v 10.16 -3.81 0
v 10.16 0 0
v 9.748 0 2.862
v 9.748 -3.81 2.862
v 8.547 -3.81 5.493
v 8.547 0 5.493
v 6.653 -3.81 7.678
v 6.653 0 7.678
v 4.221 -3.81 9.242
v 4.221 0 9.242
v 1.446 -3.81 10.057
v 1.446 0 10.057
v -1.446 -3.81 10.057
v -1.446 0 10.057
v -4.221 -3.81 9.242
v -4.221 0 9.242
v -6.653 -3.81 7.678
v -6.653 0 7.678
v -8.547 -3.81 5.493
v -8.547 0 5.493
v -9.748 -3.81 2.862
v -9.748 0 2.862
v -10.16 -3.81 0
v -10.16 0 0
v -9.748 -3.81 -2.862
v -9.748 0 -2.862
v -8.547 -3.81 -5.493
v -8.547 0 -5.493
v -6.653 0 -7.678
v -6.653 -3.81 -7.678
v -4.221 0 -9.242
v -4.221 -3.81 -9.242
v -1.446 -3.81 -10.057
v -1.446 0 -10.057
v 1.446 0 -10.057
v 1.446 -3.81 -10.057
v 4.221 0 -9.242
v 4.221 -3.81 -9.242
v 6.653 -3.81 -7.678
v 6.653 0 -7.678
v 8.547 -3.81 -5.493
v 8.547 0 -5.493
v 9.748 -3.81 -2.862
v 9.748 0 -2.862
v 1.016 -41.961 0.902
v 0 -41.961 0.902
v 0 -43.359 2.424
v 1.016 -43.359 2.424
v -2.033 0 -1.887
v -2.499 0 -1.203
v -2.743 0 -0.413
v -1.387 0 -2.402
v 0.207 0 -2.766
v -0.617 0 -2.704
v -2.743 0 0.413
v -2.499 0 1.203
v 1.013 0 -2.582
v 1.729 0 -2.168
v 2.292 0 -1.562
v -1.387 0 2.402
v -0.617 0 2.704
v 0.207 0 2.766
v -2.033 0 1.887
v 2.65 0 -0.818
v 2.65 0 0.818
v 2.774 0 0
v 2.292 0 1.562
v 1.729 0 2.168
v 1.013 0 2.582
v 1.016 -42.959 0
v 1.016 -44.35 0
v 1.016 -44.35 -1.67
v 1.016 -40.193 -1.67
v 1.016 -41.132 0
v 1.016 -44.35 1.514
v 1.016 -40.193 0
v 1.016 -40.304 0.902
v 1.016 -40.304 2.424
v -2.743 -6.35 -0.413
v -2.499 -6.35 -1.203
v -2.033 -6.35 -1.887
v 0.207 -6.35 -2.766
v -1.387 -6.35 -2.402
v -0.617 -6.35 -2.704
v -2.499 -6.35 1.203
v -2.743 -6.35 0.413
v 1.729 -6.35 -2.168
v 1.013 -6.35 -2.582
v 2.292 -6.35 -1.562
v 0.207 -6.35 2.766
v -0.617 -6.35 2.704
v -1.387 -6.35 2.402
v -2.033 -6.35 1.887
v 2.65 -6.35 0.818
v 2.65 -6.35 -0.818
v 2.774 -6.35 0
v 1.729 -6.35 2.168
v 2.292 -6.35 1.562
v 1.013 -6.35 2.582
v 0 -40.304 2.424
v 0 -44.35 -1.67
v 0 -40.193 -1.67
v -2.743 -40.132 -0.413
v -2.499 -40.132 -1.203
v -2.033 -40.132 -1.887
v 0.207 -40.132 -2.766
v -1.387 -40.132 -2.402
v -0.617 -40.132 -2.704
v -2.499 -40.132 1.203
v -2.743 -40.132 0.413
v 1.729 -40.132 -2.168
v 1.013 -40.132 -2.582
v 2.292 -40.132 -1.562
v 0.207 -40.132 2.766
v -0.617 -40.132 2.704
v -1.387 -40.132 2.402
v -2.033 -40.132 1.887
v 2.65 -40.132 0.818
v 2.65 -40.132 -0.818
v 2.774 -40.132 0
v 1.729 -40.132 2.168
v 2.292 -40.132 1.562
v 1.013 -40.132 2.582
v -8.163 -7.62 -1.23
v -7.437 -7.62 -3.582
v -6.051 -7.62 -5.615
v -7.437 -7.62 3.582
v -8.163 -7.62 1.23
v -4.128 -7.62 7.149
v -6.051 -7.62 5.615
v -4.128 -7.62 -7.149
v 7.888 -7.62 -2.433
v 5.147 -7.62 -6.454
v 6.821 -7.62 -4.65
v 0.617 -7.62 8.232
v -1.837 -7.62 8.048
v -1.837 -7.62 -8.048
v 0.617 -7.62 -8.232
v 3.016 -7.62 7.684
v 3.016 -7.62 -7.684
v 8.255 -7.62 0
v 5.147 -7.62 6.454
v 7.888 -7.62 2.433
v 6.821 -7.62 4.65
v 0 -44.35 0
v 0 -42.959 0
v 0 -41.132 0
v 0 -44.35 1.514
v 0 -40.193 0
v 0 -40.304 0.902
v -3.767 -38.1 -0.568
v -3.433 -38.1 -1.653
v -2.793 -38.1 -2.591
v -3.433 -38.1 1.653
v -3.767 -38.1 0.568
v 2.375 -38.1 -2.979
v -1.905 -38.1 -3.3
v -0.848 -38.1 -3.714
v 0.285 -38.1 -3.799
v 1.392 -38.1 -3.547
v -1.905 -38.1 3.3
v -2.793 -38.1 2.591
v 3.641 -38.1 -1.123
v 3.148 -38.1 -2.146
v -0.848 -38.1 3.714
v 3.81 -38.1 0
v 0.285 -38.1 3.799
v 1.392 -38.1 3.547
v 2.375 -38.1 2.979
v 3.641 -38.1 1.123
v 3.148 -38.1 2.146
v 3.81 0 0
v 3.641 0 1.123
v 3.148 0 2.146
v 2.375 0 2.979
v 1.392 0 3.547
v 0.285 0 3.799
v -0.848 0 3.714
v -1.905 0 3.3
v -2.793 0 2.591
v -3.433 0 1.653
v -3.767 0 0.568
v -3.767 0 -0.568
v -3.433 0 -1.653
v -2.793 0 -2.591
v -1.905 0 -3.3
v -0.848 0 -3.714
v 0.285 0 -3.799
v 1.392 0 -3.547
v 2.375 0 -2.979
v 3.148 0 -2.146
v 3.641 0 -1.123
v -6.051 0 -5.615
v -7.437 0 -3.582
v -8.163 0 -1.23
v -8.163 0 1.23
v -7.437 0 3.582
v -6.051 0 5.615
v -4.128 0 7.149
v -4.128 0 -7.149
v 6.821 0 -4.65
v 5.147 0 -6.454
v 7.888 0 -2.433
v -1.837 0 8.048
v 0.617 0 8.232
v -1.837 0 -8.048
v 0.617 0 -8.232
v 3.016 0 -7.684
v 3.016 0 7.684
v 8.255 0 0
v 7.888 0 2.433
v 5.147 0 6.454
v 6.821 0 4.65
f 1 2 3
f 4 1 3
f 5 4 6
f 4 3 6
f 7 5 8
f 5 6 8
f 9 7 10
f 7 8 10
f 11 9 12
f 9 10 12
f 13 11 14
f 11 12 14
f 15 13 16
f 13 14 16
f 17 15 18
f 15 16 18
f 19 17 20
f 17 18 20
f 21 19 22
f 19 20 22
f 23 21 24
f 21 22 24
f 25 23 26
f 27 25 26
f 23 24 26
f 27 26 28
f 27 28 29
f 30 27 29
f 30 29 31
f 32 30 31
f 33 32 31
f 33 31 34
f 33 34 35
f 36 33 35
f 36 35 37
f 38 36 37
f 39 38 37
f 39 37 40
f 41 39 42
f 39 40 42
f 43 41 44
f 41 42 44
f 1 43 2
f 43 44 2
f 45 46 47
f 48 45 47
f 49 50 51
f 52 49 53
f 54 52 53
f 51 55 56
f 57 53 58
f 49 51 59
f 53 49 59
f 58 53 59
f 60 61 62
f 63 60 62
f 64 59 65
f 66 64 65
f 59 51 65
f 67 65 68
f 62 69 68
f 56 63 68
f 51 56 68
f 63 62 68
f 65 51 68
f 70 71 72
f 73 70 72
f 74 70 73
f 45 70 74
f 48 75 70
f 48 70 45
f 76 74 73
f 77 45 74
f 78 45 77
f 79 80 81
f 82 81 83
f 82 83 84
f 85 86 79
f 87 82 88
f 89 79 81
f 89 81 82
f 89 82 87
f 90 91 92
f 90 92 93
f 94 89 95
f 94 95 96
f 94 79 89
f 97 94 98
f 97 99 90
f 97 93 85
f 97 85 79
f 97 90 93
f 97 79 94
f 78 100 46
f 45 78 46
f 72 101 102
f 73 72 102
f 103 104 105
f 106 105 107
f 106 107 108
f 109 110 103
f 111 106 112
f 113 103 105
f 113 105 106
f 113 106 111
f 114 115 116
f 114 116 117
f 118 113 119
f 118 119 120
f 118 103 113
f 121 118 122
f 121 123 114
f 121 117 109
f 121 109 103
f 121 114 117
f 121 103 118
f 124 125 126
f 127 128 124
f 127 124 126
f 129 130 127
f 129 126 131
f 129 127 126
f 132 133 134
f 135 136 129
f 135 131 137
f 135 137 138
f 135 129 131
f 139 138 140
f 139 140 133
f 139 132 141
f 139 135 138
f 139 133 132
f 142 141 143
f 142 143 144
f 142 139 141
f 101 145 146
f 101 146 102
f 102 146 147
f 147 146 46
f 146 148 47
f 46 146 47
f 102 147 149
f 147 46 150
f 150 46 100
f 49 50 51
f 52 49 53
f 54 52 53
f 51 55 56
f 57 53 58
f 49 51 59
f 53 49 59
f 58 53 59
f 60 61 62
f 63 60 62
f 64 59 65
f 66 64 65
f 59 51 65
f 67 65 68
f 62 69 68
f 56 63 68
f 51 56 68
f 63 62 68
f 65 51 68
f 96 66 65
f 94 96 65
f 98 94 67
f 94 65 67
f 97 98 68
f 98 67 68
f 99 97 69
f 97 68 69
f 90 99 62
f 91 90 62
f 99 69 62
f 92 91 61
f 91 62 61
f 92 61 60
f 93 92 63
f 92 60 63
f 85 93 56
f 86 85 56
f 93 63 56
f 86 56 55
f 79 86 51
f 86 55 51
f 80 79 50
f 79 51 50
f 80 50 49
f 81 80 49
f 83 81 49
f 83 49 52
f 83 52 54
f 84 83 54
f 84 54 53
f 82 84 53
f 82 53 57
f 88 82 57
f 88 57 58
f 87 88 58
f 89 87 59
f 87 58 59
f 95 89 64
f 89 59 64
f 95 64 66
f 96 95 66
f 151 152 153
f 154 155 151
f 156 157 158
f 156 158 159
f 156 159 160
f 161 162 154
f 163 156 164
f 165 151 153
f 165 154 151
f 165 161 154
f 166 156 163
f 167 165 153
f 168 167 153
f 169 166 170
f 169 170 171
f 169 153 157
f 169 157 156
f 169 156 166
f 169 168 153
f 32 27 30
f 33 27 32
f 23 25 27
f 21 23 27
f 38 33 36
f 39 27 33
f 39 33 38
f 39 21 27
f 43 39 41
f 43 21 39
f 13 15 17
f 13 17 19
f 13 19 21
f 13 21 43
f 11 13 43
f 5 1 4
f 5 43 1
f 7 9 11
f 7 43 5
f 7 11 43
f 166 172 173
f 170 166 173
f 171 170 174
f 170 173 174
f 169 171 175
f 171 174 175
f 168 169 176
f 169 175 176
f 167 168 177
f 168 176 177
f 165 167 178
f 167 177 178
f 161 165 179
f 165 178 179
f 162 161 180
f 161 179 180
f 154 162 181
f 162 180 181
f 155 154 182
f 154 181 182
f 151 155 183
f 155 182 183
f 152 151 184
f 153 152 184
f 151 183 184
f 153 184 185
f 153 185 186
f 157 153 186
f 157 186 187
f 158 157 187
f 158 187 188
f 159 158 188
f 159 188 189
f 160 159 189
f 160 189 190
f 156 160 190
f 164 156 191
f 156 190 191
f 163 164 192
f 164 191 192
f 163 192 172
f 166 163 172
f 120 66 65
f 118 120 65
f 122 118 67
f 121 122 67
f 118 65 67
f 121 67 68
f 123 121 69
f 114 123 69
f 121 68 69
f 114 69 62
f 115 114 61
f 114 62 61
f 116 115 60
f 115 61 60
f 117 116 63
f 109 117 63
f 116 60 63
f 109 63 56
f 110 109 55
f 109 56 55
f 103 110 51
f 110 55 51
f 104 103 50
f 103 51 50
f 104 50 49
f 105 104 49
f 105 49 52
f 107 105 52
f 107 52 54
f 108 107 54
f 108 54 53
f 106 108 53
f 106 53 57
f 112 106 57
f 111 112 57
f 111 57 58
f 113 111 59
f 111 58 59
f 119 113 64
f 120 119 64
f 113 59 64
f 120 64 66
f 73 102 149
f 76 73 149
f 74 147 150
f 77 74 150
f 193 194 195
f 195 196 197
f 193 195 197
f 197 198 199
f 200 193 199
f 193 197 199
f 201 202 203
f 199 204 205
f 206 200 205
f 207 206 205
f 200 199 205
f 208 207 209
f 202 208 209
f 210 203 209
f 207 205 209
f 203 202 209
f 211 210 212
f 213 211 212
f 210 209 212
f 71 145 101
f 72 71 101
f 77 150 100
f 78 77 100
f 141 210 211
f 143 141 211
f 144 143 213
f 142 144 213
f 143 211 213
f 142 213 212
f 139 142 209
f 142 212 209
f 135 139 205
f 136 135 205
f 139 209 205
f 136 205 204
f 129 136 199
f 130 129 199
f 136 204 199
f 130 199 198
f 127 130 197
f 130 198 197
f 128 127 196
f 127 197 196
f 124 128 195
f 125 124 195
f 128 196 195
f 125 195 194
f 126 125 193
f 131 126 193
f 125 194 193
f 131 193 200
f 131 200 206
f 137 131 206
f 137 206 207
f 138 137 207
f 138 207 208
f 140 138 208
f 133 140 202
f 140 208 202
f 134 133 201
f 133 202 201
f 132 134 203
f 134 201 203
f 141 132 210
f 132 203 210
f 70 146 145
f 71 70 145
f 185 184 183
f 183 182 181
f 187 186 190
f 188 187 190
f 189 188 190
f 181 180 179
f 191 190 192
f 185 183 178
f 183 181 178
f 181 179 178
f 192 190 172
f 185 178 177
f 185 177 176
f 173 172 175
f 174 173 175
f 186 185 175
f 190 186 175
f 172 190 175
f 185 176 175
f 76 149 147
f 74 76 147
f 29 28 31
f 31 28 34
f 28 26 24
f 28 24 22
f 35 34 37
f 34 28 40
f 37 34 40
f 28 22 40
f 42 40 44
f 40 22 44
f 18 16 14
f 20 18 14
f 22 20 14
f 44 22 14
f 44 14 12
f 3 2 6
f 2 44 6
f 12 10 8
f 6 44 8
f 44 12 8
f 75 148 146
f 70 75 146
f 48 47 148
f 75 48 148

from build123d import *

# Parameters (mm, degrees)
F0_R      = 10.16
F1_DEPTH  = 3.81
F2_R      = 8.255
F3_DEPTH  = 7.62
F4_R      = 3.81
F5_DEPTH  = 38.1
F6_R      = 2.7735730364
F7_DEPTH  = 6.35
F8_DEPTH  = 40.132
F12_DEPTH = 1.016


# Not quite as in the source:
# - a feature names something its author has since deleted; it is built from what else it names
# - the program builds the solid bodies; features that only make, move or delete a surface that nothing else refers to are left out


with BuildPart() as f1:
    # F0 (on Front) → F1 (new body)
    with BuildSketch(Plane.XZ):
        Circle(F0_R)
    extrude(amount=F1_DEPTH)


with BuildPart() as f3:
    # F2 (on Front) → F3 (new body)
    with BuildSketch(Plane.XZ):
        Circle(F2_R)
    extrude(amount=F3_DEPTH)


with BuildPart() as f5:
    # F4 (on Front) → F5 (new body)
    with BuildSketch(Plane.XZ):
        Circle(F4_R)
    extrude(amount=F5_DEPTH)


with BuildPart() as f7:
    # F6 (on Front) → F7 (new body)
    with BuildSketch(Plane.XZ):
        Circle(F6_R)
    extrude(amount=F7_DEPTH)


with BuildPart() as f8:
    # F6 (on Front) → F8 (new body)
    with BuildSketch(Plane.XZ):
        Circle(F6_R)
    extrude(amount=F8_DEPTH)


with BuildPart() as f12:
    # F11 (on Right) → F12 (new body)
    with BuildSketch(Plane.YZ):
        Polygon((-40.1932299137, -1.6699645203), (-40.1932299137, 0), (-41.132259817, 0), (-40.3038863301, 0.9020843856), (-40.3038863301, 2.4242700788), (-41.9606333038, 0.9020843856), (-43.3591868075, 2.4242700788), (-44.350001961, 1.5139291063), (-42.9590344429, 0), (-44.350001961, 0), (-44.350001961, -1.6699645203), align=None)
    extrude(amount=F12_DEPTH)


solid = Compound([f1.part, f3.part, f5.part, f7.part, f8.part, f12.part])
